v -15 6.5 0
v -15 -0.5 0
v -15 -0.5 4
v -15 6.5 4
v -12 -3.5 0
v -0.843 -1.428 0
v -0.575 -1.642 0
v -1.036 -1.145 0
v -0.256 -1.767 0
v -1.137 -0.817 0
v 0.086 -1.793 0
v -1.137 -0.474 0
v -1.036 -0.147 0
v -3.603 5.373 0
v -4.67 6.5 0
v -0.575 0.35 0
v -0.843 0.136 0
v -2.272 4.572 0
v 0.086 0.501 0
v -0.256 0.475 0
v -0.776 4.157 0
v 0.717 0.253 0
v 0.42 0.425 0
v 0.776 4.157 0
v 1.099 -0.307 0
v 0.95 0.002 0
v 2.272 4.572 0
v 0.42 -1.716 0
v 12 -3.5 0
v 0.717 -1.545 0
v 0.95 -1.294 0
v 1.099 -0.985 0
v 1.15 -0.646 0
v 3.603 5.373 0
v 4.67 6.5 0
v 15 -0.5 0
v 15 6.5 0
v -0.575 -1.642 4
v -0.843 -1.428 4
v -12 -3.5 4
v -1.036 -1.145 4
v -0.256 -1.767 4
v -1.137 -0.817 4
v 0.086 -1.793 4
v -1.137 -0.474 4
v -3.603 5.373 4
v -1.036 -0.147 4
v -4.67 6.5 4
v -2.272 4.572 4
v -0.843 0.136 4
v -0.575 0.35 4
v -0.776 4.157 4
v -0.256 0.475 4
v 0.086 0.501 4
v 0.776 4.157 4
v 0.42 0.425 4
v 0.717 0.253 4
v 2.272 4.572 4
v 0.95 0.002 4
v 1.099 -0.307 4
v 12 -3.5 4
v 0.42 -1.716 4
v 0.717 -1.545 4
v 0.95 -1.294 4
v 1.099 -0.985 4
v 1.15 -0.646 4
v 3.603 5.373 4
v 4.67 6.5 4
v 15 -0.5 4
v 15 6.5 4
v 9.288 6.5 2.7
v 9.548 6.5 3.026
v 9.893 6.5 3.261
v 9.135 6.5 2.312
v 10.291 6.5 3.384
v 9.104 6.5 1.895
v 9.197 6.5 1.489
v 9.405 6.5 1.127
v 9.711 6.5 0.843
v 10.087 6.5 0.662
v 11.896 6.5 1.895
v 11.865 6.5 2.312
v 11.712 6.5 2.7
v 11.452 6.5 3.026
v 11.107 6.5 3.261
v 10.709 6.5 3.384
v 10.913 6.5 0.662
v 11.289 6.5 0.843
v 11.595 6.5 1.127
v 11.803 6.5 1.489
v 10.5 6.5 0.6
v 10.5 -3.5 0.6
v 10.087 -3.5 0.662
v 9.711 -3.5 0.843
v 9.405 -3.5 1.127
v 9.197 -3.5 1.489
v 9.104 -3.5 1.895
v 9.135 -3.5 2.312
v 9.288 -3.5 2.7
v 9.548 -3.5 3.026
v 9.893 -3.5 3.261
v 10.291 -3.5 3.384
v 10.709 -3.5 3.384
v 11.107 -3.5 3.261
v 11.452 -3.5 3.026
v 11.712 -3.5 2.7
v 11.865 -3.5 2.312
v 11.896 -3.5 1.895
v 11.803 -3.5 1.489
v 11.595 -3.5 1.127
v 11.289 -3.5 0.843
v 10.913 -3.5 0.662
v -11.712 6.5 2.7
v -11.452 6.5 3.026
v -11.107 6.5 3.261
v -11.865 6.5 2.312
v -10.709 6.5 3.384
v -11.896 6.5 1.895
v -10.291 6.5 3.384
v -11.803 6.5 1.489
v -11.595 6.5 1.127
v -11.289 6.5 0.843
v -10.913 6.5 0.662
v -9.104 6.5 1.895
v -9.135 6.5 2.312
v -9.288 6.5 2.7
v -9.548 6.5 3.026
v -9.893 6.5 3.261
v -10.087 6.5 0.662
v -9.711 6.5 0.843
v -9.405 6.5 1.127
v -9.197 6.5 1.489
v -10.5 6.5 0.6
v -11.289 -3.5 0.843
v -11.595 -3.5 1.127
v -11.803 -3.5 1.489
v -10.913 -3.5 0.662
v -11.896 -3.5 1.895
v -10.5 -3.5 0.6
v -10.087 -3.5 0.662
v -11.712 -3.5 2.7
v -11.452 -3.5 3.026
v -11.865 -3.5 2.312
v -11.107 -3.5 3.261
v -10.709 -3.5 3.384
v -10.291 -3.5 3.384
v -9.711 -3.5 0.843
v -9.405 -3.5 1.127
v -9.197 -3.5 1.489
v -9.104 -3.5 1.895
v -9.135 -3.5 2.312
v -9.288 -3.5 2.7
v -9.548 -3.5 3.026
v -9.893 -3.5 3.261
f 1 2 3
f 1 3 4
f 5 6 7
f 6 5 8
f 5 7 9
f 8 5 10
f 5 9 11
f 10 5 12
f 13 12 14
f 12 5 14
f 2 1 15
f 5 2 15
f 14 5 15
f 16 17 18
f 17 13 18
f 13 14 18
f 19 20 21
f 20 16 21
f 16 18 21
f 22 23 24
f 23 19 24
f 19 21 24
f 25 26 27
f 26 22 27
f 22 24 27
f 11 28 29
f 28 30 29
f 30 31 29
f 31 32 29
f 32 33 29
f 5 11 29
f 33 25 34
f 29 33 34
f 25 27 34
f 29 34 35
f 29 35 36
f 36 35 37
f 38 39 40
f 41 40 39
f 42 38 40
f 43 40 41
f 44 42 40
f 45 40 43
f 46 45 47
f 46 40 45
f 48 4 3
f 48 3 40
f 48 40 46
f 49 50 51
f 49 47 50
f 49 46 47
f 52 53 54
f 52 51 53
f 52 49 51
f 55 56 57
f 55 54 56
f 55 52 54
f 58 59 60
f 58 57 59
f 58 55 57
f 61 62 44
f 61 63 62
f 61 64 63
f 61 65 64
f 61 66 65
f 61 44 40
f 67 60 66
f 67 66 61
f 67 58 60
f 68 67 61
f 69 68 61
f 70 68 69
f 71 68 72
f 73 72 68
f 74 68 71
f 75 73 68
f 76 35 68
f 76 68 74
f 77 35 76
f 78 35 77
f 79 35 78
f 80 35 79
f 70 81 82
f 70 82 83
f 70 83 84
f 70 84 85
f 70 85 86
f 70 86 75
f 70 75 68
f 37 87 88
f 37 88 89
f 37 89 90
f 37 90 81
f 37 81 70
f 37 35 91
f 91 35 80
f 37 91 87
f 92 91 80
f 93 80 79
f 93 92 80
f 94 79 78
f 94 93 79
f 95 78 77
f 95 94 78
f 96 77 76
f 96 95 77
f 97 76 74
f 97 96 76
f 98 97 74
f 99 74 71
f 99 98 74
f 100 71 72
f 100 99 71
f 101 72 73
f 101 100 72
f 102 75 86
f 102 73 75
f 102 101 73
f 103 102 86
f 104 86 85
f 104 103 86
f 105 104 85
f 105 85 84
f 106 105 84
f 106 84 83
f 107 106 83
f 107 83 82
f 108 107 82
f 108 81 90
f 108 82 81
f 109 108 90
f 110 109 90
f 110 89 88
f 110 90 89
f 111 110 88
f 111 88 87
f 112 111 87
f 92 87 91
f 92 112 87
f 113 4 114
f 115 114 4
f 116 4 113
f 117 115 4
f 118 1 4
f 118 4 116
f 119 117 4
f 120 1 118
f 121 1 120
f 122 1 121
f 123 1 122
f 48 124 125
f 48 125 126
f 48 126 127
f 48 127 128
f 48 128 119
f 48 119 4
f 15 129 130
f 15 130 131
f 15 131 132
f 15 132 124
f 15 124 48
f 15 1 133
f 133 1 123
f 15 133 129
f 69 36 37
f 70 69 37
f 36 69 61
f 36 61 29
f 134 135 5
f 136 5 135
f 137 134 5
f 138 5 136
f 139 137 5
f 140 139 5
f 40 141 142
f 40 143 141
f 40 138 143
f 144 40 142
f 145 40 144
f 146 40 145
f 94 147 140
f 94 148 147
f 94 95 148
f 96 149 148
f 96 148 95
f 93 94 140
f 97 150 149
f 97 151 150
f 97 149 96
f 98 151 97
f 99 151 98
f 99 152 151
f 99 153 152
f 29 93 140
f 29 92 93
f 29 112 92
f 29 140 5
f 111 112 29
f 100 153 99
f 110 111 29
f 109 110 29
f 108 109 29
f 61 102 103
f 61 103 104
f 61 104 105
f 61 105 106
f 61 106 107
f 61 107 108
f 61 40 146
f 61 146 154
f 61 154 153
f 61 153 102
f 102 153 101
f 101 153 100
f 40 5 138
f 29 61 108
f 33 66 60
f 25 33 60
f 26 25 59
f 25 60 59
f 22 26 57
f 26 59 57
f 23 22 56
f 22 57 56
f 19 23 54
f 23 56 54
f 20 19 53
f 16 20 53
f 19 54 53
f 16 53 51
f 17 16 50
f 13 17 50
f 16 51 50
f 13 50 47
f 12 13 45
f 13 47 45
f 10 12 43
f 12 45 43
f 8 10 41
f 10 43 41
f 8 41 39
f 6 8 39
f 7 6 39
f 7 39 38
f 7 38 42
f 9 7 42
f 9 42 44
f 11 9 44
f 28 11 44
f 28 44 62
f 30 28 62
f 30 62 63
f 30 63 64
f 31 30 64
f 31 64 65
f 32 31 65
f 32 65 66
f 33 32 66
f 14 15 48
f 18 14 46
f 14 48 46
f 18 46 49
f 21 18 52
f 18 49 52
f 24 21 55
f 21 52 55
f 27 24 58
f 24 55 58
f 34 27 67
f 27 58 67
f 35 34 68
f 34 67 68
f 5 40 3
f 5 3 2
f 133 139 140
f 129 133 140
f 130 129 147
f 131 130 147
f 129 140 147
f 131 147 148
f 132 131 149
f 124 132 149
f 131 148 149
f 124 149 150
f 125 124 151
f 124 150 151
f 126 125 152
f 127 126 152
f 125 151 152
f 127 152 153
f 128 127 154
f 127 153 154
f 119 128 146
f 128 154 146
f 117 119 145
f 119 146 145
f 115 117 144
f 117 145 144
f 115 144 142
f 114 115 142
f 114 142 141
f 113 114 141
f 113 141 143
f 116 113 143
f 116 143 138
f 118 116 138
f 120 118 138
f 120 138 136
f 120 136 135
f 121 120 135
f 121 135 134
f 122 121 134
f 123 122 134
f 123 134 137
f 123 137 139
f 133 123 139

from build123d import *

# Parameters (mm, degrees)
SKETCH_1_W          = 30
SKETCH_1_H          = 13
EXTRUDE_1_DEPTH     = 4
SKETCH_3_R          = 5.75
CUT_EXTRUDE_2_DEPTH = 10
SKETCH_7_W          = 30
SKETCH_7_H          = 3
CUT_EXTRUDE_3_DEPTH = 10
CHAMFER_1_SIZE      = 3
SKETCH_8_R          = 1.4
CUT_EXTRUDE_4_DEPTH = 19.466185313
SKETCH_5_R          = 1.15
CUT_EXTRUDE_5_DEPTH = 10


with BuildPart() as part:
    # 草图1 → 凸台-拉伸1 (new body)
    with BuildSketch(Plane.XY):
        Rectangle(SKETCH_1_W, SKETCH_1_H)
    extrude(amount=EXTRUDE_1_DEPTH)

    # 草图3 → 切除-拉伸2 (cut)
    with BuildSketch(Plane.XY.offset(4)):
        with Locations((0, 9.854101966)):
            Circle(SKETCH_3_R)
    extrude(amount=-CUT_EXTRUDE_2_DEPTH, mode=Mode.SUBTRACT)

    # 草图7 → 切除-拉伸3 (cut)
    with BuildSketch(Plane.XY.offset(4)):
        with Locations((0, -5)):
            Rectangle(SKETCH_7_W, SKETCH_7_H)
    extrude(amount=-CUT_EXTRUDE_3_DEPTH, mode=Mode.SUBTRACT)

    # 倒角1
    chamfer_1_edges = [part.edges().sort_by_distance(p)[0] for p in [
        (-15, -3.5, 2),
        (15, -3.5, 2),
    ]]
    chamfer(chamfer_1_edges, length=CHAMFER_1_SIZE)

    # 草图8 → 切除-拉伸4 (cut, through all)
    with BuildSketch(Plane.XZ.offset(3.5)):
        with Locations(Location((-10.5, 2, 0), (0, 0, 270))):
            Circle(SKETCH_8_R)
    cut_extrude_4 = extrude(amount=-CUT_EXTRUDE_4_DEPTH, mode=Mode.SUBTRACT)

    # 镜向1: 切除-拉伸4 across plane
    add(cut_extrude_4.mirror(Plane(origin=(0, 0, 0), x_dir=(0, 0, 1), z_dir=(1, 0, 0))), mode=Mode.SUBTRACT)

    # 草图5 → 切除-拉伸5 (cut)
    with BuildSketch(Plane.XY.offset(4)):
        with Locations((0, -0.645898034)):
            Circle(SKETCH_5_R)
    extrude(amount=-CUT_EXTRUDE_5_DEPTH, mode=Mode.SUBTRACT)


solid = part.part
